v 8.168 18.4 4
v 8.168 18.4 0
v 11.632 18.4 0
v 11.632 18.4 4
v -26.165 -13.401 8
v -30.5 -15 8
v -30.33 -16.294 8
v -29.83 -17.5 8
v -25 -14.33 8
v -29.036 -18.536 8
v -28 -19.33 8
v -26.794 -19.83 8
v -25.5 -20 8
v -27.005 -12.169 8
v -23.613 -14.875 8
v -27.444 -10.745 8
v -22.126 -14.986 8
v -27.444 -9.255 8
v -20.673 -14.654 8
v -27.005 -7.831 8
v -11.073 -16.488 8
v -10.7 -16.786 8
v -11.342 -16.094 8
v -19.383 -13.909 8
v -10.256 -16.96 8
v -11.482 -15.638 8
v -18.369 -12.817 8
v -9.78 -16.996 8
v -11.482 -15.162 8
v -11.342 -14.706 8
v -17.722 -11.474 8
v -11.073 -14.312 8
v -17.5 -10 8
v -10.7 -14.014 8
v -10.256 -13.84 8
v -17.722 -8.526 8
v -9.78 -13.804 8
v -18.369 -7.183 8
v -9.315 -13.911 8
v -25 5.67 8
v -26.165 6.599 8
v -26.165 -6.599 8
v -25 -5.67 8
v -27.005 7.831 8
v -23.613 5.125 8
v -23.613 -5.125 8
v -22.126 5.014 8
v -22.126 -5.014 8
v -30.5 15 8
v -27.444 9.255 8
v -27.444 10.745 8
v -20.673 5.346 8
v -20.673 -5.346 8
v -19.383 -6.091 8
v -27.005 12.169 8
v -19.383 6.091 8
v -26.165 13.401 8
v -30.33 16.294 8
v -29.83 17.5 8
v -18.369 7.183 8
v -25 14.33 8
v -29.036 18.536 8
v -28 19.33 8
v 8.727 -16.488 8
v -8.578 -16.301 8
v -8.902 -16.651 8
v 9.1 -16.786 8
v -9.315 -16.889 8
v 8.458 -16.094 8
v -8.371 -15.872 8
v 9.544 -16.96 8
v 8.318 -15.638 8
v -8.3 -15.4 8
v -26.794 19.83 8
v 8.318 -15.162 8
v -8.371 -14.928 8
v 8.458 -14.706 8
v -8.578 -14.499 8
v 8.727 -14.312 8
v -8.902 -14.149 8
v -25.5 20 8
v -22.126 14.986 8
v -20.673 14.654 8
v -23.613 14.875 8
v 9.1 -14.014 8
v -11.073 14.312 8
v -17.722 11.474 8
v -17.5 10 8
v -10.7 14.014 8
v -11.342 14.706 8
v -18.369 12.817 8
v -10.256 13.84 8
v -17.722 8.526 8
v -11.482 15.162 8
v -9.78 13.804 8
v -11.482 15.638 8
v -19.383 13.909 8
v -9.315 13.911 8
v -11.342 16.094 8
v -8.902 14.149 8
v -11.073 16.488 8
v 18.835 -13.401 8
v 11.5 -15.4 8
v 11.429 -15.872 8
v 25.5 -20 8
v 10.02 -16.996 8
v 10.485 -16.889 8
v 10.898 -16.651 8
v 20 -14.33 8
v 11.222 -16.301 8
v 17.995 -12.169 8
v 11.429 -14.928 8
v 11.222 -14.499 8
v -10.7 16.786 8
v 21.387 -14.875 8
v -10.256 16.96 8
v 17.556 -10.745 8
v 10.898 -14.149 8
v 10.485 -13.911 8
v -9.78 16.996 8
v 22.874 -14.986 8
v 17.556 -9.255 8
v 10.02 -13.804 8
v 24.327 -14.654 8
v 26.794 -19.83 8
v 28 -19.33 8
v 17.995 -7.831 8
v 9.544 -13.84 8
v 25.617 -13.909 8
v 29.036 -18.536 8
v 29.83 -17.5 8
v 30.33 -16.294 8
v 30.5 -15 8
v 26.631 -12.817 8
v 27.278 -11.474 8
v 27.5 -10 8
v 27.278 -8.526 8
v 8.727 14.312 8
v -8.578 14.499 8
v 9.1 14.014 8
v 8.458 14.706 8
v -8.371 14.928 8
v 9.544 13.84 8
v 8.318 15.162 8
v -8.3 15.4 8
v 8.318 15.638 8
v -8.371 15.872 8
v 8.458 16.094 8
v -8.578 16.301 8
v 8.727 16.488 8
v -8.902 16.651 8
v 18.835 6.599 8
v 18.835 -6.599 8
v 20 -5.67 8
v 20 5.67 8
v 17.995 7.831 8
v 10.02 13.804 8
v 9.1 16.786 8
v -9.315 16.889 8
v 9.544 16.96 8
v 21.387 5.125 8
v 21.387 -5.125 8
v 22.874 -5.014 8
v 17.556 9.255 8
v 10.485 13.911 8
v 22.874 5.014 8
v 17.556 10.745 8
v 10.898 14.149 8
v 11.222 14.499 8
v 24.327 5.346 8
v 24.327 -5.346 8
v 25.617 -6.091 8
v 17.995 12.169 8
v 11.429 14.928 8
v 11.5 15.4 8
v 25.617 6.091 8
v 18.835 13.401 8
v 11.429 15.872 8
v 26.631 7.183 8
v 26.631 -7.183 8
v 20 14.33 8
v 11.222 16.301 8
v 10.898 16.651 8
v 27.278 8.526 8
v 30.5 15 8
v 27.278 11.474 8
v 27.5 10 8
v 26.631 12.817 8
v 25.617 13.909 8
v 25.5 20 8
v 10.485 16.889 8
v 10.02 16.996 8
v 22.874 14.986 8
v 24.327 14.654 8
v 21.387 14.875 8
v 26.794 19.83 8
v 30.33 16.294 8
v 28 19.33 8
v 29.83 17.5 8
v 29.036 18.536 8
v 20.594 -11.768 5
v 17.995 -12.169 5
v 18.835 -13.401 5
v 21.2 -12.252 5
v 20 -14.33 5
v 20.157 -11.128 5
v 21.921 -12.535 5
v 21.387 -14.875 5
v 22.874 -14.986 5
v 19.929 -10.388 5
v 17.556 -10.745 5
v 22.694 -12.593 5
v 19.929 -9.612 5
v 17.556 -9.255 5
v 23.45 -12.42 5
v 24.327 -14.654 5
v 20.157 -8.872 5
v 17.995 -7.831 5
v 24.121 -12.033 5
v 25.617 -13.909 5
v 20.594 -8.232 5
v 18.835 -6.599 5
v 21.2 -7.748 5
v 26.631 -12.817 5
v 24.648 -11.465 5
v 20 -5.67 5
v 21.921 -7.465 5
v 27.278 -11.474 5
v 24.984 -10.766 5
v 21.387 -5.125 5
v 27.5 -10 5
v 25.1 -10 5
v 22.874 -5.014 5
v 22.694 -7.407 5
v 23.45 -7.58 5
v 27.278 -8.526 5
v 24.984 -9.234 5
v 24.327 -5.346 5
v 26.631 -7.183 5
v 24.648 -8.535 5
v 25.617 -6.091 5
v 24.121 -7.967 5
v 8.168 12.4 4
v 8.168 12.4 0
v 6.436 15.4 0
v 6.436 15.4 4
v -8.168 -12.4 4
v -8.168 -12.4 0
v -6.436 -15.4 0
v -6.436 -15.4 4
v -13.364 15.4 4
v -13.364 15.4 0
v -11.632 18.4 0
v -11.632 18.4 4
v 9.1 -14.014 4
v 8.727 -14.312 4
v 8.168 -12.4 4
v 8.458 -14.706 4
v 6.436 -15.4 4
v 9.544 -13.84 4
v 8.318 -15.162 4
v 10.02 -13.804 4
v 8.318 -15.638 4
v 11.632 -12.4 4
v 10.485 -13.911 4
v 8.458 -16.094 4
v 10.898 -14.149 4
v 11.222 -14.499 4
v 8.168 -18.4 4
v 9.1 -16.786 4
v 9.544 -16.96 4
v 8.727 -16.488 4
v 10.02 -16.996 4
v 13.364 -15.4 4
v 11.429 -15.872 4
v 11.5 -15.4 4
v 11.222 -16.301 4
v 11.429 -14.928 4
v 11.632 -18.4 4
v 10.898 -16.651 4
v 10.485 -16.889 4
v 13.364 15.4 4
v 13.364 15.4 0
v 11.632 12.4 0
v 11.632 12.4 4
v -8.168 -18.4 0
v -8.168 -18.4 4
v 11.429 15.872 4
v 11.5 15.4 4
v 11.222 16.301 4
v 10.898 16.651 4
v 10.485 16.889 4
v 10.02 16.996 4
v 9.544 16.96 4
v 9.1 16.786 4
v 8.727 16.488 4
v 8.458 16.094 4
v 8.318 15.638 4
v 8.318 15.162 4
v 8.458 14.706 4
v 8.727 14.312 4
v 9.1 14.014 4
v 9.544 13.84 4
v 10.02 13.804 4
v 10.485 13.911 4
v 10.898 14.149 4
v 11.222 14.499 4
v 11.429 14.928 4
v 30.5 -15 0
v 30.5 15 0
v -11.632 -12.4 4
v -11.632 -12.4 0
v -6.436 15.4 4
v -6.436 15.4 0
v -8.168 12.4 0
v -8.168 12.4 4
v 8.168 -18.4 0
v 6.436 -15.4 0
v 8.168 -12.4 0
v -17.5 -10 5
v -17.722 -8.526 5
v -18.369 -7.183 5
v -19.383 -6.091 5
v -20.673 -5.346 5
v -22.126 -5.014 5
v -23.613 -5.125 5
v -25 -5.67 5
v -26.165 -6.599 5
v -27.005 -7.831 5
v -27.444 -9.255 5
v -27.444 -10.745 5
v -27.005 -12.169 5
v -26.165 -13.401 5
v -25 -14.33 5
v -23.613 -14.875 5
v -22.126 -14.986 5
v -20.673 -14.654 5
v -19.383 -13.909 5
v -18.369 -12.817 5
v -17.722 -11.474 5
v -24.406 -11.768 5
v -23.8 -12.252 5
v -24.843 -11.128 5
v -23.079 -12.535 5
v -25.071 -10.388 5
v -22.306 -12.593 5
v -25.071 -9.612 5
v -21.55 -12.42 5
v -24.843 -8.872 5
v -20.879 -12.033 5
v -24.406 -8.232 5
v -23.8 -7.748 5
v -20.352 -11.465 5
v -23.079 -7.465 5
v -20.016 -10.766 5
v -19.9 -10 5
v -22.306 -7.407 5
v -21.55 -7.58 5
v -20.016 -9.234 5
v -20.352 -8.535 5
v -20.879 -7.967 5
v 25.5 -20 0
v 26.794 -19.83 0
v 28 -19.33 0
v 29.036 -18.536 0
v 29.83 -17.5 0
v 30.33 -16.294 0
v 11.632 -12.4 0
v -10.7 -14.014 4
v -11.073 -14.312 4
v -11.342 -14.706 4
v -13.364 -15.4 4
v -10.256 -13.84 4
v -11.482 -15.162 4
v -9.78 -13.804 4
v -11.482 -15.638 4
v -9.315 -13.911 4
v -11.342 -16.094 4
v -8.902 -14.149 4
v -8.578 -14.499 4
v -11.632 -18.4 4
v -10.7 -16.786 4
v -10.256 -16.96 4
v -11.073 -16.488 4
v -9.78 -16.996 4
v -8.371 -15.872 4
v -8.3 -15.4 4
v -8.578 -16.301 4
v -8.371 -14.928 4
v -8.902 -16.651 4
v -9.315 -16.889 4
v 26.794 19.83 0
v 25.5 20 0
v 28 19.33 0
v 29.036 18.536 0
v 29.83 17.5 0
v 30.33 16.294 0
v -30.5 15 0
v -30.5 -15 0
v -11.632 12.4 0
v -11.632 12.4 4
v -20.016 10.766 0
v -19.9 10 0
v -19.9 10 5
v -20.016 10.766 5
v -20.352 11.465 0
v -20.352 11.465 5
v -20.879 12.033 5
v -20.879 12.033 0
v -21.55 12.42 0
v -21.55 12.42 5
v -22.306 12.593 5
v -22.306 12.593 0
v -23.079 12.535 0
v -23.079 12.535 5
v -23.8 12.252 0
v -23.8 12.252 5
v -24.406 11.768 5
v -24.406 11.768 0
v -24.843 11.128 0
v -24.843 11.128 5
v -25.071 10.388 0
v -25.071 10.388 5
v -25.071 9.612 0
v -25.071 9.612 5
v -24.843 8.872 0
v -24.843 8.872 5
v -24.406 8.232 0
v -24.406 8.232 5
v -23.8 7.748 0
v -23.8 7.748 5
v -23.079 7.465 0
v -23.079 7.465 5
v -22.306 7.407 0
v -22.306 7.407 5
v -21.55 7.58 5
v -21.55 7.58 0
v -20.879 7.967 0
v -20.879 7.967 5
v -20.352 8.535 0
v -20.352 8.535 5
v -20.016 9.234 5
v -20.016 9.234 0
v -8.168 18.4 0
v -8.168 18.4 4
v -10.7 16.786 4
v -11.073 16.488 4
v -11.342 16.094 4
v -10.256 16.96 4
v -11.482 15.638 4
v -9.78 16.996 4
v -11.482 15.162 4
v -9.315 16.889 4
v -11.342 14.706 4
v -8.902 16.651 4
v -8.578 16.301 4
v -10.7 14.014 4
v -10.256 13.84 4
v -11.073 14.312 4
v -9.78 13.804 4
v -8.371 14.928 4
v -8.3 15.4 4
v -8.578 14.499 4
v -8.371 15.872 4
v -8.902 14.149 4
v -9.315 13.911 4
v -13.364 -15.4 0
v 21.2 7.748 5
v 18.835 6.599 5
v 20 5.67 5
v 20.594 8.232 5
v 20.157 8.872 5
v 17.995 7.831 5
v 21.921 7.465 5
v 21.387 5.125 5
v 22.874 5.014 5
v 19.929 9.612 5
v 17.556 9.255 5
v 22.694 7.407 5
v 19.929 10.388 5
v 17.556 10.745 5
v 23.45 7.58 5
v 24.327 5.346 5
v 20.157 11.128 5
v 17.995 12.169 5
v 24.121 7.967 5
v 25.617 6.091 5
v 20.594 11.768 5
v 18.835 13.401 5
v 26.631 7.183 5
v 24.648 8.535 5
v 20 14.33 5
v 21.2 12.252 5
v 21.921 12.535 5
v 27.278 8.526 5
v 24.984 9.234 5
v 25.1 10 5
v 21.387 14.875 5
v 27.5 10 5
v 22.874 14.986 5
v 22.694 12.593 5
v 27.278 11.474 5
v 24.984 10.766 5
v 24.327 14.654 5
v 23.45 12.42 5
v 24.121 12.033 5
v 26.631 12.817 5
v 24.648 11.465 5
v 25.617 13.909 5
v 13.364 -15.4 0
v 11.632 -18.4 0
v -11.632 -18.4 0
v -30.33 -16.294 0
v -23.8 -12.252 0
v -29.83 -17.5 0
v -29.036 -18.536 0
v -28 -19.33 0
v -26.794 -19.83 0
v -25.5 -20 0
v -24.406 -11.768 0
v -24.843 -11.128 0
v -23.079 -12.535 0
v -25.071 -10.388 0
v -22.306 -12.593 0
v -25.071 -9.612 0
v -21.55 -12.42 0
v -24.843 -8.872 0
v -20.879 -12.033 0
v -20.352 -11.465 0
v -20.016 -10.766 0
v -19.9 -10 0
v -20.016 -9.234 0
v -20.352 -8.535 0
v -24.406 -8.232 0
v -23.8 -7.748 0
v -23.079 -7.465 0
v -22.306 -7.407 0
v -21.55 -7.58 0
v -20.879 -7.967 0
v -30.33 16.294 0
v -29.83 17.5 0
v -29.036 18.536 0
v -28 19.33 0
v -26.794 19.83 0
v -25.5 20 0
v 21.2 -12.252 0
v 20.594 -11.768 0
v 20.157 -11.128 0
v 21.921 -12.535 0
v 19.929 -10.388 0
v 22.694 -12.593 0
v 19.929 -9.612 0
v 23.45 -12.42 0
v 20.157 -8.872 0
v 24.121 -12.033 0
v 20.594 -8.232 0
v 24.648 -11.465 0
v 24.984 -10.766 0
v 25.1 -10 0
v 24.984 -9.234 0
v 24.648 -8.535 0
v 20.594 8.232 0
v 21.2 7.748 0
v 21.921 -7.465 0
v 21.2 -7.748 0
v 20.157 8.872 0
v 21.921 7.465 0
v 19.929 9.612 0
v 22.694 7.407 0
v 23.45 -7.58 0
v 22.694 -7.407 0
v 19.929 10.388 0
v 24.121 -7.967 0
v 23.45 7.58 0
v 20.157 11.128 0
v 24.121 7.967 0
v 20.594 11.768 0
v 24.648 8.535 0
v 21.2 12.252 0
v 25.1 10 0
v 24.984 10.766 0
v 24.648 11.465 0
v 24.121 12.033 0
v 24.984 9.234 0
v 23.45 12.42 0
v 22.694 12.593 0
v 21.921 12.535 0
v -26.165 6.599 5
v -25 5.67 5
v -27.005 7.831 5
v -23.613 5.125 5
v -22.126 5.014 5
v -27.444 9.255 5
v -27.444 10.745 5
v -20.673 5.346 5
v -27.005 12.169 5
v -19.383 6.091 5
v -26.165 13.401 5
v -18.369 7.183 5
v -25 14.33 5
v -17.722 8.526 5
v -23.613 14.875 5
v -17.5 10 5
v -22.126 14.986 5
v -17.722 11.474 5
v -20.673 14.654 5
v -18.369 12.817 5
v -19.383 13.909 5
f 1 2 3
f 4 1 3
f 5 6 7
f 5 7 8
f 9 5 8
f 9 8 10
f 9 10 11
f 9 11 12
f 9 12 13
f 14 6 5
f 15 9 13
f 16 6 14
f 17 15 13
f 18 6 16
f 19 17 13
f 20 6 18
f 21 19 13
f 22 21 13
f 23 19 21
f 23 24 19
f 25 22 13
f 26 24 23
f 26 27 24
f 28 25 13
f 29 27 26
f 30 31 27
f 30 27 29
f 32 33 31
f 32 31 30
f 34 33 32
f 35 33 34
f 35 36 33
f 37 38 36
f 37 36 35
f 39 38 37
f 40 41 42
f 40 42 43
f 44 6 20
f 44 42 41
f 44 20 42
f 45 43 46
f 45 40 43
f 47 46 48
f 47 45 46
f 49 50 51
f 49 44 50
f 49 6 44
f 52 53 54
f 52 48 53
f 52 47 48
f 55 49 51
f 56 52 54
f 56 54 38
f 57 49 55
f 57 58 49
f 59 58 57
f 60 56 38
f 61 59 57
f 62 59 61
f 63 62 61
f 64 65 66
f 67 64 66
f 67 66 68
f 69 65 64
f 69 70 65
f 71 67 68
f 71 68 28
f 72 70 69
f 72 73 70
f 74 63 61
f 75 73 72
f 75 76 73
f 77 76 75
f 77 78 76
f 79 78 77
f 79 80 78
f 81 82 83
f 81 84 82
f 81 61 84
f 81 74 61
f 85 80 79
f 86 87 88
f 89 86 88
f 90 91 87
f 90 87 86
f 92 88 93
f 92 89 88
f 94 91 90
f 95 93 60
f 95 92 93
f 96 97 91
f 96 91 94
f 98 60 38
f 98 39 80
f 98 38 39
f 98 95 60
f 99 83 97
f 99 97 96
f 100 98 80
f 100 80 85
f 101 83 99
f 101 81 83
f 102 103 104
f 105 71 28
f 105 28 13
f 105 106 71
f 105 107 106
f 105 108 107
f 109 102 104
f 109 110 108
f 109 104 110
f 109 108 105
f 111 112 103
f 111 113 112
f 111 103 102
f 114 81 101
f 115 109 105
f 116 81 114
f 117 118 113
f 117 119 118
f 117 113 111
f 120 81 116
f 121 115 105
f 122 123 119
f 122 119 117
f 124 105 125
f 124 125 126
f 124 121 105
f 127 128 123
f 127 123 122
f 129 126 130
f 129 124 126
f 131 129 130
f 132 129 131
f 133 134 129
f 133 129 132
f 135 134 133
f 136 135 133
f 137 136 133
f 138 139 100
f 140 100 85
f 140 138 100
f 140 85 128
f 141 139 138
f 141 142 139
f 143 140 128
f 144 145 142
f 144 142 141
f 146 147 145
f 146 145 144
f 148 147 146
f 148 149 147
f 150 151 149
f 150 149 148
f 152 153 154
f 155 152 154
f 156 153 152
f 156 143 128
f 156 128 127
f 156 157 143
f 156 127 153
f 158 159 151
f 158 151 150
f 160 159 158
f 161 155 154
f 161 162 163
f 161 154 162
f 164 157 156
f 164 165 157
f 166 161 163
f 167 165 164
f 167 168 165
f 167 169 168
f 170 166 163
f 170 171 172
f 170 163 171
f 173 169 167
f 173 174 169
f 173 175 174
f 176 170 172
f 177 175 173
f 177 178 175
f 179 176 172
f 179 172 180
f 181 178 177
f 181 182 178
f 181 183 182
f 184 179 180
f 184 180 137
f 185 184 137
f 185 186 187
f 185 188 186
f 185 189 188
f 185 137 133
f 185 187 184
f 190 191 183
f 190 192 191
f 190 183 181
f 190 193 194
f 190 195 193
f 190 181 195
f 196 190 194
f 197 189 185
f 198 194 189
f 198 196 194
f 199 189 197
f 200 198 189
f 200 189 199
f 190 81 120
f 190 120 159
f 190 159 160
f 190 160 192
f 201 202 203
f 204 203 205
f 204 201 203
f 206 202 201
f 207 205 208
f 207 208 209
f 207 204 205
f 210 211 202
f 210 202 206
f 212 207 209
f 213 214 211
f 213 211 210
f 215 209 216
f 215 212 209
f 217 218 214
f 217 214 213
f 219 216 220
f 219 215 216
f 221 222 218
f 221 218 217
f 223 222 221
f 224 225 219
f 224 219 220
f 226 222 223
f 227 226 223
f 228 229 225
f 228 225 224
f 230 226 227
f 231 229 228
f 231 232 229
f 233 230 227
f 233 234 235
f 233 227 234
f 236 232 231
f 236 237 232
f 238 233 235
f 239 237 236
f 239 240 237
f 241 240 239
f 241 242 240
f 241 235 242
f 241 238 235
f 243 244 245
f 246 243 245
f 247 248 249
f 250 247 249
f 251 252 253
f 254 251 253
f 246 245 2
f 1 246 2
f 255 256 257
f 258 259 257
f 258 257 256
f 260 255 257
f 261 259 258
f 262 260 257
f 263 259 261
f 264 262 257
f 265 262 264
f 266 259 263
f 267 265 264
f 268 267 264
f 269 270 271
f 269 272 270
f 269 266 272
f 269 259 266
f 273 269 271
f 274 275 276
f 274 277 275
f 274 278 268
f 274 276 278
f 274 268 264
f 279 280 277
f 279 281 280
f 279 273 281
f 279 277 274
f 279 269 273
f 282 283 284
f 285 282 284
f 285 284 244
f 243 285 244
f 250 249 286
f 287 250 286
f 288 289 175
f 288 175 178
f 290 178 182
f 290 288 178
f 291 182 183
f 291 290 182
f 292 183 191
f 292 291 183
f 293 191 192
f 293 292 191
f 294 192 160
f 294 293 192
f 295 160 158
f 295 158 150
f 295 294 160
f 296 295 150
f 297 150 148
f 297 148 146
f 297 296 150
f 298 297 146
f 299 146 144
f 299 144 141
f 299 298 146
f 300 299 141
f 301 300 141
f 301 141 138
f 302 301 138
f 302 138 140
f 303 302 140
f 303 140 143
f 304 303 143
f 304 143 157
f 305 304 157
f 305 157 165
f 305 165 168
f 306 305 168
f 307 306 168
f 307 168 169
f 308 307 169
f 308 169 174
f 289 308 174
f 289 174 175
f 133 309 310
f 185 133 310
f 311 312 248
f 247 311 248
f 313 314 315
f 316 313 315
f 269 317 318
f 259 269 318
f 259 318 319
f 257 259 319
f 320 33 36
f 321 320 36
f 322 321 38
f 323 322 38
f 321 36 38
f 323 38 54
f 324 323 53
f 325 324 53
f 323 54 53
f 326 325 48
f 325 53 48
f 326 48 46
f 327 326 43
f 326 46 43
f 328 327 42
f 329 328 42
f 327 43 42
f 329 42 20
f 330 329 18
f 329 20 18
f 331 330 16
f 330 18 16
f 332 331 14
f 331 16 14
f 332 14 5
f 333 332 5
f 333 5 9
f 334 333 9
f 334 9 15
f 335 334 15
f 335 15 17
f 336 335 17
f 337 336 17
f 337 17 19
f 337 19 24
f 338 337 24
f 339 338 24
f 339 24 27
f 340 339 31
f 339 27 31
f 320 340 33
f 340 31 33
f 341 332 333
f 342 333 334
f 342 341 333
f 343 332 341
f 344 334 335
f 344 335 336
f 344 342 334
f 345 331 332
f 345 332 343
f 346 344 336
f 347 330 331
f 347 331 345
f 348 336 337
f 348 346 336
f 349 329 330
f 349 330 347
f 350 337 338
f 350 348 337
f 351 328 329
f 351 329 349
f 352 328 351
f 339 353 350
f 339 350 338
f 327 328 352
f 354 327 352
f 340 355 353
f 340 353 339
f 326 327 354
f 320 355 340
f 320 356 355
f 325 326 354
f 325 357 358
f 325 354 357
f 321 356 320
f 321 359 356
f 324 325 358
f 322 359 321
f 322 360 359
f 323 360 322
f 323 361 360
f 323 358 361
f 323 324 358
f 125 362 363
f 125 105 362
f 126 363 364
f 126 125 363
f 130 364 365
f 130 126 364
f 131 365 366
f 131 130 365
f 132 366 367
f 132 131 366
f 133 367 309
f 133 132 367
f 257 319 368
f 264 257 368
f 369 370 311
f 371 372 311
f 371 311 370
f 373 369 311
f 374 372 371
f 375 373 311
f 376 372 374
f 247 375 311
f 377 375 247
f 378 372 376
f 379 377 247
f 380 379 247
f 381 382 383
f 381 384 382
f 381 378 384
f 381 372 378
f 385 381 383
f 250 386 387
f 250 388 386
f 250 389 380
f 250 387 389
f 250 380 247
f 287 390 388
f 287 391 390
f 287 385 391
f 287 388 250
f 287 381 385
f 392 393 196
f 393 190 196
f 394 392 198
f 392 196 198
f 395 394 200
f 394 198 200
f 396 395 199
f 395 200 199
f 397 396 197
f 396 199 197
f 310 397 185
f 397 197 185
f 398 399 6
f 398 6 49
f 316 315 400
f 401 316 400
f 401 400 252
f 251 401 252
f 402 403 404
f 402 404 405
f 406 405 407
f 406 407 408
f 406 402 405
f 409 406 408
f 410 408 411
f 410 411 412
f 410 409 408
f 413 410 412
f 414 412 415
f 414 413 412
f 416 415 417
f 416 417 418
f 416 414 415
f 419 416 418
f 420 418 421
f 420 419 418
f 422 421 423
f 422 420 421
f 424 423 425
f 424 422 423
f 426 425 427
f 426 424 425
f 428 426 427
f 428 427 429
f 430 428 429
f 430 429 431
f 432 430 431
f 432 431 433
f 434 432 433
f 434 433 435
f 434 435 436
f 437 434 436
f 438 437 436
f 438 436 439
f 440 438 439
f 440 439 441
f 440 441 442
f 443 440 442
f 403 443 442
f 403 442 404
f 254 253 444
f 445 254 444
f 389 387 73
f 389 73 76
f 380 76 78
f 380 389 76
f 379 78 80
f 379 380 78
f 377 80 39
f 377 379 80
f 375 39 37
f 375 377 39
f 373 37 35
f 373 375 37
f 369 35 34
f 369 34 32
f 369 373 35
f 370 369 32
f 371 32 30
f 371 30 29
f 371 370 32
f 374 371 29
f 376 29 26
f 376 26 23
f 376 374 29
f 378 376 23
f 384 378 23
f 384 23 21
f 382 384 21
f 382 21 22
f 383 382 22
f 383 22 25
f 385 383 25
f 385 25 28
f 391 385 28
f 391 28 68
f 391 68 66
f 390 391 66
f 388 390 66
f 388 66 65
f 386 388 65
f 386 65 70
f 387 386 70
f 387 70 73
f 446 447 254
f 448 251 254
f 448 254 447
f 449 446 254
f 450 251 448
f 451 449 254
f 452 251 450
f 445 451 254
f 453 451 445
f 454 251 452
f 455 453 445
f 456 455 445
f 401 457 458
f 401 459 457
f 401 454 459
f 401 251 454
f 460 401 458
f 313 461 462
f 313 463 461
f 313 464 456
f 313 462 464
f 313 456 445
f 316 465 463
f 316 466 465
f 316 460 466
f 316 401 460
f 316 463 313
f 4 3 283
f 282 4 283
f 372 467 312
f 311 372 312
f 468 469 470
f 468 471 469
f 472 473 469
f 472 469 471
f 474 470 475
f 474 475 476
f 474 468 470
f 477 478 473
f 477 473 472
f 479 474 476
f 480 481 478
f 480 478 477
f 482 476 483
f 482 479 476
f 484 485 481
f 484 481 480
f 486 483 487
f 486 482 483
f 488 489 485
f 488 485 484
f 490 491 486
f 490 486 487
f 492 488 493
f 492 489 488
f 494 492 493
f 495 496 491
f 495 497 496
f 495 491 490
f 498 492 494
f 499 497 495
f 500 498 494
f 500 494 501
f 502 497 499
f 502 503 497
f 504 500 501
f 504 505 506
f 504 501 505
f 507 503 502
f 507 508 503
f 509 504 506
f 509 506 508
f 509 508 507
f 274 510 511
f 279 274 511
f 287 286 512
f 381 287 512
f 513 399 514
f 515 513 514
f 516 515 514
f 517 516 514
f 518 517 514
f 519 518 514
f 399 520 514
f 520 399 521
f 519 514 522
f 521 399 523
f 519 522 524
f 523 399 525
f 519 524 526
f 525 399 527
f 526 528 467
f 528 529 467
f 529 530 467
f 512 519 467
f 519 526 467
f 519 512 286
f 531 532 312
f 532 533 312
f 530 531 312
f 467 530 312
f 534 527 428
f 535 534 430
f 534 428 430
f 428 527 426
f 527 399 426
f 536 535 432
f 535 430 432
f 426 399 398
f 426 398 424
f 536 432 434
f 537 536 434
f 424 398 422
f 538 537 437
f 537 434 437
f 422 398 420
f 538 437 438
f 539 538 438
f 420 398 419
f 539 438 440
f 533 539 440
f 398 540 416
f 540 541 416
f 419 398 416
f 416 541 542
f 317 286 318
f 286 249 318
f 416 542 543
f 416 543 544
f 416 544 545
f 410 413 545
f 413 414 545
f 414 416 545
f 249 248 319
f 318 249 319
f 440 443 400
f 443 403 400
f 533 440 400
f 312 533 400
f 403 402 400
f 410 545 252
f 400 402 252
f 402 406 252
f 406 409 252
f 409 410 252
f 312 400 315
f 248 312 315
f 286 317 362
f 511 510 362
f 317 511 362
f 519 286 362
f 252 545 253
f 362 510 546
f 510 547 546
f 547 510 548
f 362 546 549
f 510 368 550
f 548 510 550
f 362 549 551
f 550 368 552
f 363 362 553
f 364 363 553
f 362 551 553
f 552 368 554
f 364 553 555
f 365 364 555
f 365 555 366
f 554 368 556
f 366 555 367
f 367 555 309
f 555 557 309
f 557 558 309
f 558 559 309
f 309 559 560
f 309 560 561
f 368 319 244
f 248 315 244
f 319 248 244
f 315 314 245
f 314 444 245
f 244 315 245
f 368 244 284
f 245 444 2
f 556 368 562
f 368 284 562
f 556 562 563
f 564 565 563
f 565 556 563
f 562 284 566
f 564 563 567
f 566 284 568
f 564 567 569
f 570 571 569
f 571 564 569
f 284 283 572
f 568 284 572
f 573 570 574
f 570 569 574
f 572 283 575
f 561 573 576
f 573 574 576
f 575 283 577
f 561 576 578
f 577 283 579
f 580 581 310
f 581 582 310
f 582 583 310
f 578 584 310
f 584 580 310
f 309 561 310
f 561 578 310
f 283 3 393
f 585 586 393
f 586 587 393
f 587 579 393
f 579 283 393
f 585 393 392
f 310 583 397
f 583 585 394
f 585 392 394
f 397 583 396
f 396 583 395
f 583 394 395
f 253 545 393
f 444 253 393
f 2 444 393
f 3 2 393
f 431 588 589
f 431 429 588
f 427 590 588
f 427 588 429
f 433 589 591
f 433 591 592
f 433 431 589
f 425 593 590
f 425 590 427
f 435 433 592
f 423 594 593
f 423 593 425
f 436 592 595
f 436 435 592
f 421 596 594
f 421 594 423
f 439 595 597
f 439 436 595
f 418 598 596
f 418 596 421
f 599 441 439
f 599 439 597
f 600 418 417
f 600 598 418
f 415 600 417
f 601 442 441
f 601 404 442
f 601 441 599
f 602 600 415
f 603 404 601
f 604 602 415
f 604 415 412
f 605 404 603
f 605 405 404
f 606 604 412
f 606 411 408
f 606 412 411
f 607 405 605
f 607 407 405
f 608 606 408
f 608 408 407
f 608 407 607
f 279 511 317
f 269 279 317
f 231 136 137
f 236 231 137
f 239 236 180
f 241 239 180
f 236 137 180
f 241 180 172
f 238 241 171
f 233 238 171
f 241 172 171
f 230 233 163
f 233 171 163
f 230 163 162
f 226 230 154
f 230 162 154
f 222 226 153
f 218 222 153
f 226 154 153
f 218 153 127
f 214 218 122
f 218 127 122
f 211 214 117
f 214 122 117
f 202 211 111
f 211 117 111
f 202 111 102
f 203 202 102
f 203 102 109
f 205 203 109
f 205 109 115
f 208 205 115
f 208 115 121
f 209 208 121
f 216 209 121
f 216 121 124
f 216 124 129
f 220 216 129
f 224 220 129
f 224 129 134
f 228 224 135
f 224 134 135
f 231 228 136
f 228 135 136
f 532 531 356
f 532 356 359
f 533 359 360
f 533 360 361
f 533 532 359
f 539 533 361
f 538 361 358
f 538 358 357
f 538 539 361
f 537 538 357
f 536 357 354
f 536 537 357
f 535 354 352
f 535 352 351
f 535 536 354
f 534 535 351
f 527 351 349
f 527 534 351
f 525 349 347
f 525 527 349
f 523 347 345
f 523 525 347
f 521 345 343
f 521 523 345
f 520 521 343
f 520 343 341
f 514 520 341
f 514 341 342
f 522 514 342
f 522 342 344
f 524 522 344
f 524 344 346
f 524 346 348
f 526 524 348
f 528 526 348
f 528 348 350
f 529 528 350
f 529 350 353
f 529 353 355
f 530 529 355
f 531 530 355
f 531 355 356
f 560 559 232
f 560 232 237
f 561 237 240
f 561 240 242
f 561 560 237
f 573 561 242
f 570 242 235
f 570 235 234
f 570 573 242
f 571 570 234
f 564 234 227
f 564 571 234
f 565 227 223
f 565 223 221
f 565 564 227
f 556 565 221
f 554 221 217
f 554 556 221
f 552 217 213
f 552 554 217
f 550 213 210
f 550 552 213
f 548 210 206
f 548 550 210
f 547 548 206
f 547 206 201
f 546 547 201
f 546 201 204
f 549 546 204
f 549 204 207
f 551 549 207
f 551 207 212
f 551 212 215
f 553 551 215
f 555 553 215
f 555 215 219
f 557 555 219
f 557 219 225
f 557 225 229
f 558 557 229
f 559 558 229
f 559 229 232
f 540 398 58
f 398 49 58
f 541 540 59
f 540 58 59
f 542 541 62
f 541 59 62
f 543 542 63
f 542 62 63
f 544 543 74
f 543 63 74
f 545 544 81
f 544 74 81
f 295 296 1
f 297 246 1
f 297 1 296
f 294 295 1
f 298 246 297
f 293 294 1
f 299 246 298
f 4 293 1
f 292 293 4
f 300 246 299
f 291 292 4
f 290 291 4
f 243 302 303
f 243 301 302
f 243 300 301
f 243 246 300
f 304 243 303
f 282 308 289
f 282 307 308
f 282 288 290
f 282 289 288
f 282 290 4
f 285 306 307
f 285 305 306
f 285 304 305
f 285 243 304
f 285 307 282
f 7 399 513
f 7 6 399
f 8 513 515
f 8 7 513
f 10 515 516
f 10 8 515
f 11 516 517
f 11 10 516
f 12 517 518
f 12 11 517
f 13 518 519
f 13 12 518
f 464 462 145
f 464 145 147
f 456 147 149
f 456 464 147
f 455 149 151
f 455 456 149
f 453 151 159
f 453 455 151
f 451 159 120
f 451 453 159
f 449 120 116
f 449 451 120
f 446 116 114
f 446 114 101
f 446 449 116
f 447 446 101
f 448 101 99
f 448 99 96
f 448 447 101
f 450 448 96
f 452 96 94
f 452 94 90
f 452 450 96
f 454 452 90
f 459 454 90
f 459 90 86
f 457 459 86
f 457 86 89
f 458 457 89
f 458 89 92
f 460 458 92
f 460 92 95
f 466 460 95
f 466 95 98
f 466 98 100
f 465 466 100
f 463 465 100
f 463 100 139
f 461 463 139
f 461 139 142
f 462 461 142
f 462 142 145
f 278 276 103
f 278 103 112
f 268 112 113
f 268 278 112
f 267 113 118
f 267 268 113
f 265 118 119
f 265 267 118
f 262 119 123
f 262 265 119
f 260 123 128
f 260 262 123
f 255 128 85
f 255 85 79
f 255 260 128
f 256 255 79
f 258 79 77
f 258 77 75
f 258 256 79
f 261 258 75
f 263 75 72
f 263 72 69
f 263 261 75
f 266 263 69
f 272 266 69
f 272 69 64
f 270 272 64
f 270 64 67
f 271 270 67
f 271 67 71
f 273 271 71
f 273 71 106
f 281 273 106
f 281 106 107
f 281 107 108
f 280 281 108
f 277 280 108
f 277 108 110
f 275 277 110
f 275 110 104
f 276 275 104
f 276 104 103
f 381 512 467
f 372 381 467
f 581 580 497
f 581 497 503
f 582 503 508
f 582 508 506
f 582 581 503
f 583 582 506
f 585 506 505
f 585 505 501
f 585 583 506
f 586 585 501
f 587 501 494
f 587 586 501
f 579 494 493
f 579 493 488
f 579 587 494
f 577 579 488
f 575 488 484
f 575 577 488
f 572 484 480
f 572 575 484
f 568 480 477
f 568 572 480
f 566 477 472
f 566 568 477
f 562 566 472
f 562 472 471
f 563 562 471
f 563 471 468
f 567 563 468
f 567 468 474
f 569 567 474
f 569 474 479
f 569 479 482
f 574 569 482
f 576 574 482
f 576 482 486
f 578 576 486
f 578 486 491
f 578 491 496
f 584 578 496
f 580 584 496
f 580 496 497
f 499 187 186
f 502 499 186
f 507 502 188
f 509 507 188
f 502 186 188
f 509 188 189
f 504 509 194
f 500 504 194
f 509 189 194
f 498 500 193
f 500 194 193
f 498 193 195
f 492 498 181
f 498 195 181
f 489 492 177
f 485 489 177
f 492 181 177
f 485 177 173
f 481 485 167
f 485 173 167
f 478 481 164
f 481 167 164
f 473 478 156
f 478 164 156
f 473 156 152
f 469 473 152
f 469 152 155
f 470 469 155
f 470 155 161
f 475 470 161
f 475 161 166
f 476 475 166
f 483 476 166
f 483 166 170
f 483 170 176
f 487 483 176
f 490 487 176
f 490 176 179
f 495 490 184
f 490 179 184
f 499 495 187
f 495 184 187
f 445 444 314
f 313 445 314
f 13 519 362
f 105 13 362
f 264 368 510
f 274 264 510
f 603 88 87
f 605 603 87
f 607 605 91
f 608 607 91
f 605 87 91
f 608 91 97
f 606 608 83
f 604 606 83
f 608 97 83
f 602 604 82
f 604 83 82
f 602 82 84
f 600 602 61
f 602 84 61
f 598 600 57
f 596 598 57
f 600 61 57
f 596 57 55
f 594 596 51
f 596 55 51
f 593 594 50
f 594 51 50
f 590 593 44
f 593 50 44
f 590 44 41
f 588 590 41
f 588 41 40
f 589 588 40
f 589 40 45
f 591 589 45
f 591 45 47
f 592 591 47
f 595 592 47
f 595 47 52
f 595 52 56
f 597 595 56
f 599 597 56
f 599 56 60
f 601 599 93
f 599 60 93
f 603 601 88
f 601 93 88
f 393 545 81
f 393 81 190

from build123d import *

# Parameters (mm, degrees)
F0_W     = 61
F0_H     = 40
F0_R     = 1.6
F0_R_2   = 2.6
F1_DEPTH = 8
F2_R     = 5
F2_R_2   = 2.6
F3_DEPTH = 3
F4_R     = 1.6
F5_DEPTH = 4
F6_R     = 5


with BuildPart() as f1:
    # F0 (on Top) → F1 (new body)
    with BuildSketch(Plane.XY):
        Rectangle(F0_W, F0_H)
        with Locations((-9.9, -15.4)):
            Circle(F0_R, mode=Mode.SUBTRACT)
        with Locations((-22.5, -10)):
            Circle(F0_R_2, mode=Mode.SUBTRACT)
        with Locations((9.9, -15.4)):
            Circle(F0_R, mode=Mode.SUBTRACT)
        with Locations((22.5, -10)):
            Circle(F0_R_2, mode=Mode.SUBTRACT)
        with Locations((-22.5, 10)):
            Circle(F0_R_2, mode=Mode.SUBTRACT)
        with Locations((-9.9, 15.4)):
            Circle(F0_R, mode=Mode.SUBTRACT)
        with Locations((9.9, 15.4)):
            Circle(F0_R, mode=Mode.SUBTRACT)
        with Locations((22.5, 10)):
            Circle(F0_R_2, mode=Mode.SUBTRACT)
    extrude(amount=F1_DEPTH)

    # F2 (on face) → F3 (cut)
    with BuildSketch(Plane.XY.offset(8)):
        with Locations((-22.5, 10)):
            Circle(F2_R)
        with Locations((-22.5, 10)):
            Circle(F2_R_2, mode=Mode.SUBTRACT)
        with Locations((22.5, 10)):
            Circle(F2_R)
        with Locations((22.5, 10)):
            Circle(F2_R_2, mode=Mode.SUBTRACT)
        with Locations((22.5, -10)):
            Circle(F2_R)
        with Locations((22.5, -10)):
            Circle(F2_R_2, mode=Mode.SUBTRACT)
        with Locations((-22.5, -10)):
            Circle(F2_R)
        with Locations((-22.5, -10)):
            Circle(F2_R_2, mode=Mode.SUBTRACT)
    extrude(amount=-F3_DEPTH, mode=Mode.SUBTRACT)

    # F4 (on face) → F5 (cut)
    with BuildSketch(Plane(origin=(0, 0, 0), x_dir=(1, 0, 0), z_dir=(0, 0, -1))):
        Polygon((-8.167949, 18.4), (-11.632051, 18.4), (-13.364102, 15.4), (-11.632051, 12.4), (-8.167949, 12.4), (-6.435898, 15.4), align=None)
        with Locations((-9.9, 15.4)):
            Circle(F4_R, mode=Mode.SUBTRACT)
        Polygon((11.632051, 18.4), (8.167949, 18.4), (6.435898, 15.4), (8.167949, 12.4), (11.632051, 12.4), (13.364102, 15.4), align=None)
        with Locations((9.9, 15.4)):
            Circle(F4_R, mode=Mode.SUBTRACT)
        Polygon((-8.167949, -12.4), (-11.632051, -12.4), (-13.364102, -15.4), (-11.632051, -18.4), (-8.167949, -18.4), (-6.435898, -15.4), align=None)
        with Locations((-9.9, -15.4)):
            Circle(F4_R, mode=Mode.SUBTRACT)
        Polygon((8.167949, -18.4), (11.632051, -18.4), (13.364102, -15.4), (11.632051, -12.4), (8.167949, -12.4), (6.435898, -15.4), align=None)
        with Locations((9.9, -15.4)):
            Circle(F4_R, mode=Mode.SUBTRACT)
    extrude(amount=-F5_DEPTH, mode=Mode.SUBTRACT)

    # F6
    f6_edges = [f1.edges().sort_by_distance(p)[0] for p in [
        (-30.5, 20, 4),
        (-30.5, -20, 4),
        (30.5, -20, 4),
        (30.5, 20, 4),
    ]]
    fillet(f6_edges, radius=F6_R)


solid = f1.part
